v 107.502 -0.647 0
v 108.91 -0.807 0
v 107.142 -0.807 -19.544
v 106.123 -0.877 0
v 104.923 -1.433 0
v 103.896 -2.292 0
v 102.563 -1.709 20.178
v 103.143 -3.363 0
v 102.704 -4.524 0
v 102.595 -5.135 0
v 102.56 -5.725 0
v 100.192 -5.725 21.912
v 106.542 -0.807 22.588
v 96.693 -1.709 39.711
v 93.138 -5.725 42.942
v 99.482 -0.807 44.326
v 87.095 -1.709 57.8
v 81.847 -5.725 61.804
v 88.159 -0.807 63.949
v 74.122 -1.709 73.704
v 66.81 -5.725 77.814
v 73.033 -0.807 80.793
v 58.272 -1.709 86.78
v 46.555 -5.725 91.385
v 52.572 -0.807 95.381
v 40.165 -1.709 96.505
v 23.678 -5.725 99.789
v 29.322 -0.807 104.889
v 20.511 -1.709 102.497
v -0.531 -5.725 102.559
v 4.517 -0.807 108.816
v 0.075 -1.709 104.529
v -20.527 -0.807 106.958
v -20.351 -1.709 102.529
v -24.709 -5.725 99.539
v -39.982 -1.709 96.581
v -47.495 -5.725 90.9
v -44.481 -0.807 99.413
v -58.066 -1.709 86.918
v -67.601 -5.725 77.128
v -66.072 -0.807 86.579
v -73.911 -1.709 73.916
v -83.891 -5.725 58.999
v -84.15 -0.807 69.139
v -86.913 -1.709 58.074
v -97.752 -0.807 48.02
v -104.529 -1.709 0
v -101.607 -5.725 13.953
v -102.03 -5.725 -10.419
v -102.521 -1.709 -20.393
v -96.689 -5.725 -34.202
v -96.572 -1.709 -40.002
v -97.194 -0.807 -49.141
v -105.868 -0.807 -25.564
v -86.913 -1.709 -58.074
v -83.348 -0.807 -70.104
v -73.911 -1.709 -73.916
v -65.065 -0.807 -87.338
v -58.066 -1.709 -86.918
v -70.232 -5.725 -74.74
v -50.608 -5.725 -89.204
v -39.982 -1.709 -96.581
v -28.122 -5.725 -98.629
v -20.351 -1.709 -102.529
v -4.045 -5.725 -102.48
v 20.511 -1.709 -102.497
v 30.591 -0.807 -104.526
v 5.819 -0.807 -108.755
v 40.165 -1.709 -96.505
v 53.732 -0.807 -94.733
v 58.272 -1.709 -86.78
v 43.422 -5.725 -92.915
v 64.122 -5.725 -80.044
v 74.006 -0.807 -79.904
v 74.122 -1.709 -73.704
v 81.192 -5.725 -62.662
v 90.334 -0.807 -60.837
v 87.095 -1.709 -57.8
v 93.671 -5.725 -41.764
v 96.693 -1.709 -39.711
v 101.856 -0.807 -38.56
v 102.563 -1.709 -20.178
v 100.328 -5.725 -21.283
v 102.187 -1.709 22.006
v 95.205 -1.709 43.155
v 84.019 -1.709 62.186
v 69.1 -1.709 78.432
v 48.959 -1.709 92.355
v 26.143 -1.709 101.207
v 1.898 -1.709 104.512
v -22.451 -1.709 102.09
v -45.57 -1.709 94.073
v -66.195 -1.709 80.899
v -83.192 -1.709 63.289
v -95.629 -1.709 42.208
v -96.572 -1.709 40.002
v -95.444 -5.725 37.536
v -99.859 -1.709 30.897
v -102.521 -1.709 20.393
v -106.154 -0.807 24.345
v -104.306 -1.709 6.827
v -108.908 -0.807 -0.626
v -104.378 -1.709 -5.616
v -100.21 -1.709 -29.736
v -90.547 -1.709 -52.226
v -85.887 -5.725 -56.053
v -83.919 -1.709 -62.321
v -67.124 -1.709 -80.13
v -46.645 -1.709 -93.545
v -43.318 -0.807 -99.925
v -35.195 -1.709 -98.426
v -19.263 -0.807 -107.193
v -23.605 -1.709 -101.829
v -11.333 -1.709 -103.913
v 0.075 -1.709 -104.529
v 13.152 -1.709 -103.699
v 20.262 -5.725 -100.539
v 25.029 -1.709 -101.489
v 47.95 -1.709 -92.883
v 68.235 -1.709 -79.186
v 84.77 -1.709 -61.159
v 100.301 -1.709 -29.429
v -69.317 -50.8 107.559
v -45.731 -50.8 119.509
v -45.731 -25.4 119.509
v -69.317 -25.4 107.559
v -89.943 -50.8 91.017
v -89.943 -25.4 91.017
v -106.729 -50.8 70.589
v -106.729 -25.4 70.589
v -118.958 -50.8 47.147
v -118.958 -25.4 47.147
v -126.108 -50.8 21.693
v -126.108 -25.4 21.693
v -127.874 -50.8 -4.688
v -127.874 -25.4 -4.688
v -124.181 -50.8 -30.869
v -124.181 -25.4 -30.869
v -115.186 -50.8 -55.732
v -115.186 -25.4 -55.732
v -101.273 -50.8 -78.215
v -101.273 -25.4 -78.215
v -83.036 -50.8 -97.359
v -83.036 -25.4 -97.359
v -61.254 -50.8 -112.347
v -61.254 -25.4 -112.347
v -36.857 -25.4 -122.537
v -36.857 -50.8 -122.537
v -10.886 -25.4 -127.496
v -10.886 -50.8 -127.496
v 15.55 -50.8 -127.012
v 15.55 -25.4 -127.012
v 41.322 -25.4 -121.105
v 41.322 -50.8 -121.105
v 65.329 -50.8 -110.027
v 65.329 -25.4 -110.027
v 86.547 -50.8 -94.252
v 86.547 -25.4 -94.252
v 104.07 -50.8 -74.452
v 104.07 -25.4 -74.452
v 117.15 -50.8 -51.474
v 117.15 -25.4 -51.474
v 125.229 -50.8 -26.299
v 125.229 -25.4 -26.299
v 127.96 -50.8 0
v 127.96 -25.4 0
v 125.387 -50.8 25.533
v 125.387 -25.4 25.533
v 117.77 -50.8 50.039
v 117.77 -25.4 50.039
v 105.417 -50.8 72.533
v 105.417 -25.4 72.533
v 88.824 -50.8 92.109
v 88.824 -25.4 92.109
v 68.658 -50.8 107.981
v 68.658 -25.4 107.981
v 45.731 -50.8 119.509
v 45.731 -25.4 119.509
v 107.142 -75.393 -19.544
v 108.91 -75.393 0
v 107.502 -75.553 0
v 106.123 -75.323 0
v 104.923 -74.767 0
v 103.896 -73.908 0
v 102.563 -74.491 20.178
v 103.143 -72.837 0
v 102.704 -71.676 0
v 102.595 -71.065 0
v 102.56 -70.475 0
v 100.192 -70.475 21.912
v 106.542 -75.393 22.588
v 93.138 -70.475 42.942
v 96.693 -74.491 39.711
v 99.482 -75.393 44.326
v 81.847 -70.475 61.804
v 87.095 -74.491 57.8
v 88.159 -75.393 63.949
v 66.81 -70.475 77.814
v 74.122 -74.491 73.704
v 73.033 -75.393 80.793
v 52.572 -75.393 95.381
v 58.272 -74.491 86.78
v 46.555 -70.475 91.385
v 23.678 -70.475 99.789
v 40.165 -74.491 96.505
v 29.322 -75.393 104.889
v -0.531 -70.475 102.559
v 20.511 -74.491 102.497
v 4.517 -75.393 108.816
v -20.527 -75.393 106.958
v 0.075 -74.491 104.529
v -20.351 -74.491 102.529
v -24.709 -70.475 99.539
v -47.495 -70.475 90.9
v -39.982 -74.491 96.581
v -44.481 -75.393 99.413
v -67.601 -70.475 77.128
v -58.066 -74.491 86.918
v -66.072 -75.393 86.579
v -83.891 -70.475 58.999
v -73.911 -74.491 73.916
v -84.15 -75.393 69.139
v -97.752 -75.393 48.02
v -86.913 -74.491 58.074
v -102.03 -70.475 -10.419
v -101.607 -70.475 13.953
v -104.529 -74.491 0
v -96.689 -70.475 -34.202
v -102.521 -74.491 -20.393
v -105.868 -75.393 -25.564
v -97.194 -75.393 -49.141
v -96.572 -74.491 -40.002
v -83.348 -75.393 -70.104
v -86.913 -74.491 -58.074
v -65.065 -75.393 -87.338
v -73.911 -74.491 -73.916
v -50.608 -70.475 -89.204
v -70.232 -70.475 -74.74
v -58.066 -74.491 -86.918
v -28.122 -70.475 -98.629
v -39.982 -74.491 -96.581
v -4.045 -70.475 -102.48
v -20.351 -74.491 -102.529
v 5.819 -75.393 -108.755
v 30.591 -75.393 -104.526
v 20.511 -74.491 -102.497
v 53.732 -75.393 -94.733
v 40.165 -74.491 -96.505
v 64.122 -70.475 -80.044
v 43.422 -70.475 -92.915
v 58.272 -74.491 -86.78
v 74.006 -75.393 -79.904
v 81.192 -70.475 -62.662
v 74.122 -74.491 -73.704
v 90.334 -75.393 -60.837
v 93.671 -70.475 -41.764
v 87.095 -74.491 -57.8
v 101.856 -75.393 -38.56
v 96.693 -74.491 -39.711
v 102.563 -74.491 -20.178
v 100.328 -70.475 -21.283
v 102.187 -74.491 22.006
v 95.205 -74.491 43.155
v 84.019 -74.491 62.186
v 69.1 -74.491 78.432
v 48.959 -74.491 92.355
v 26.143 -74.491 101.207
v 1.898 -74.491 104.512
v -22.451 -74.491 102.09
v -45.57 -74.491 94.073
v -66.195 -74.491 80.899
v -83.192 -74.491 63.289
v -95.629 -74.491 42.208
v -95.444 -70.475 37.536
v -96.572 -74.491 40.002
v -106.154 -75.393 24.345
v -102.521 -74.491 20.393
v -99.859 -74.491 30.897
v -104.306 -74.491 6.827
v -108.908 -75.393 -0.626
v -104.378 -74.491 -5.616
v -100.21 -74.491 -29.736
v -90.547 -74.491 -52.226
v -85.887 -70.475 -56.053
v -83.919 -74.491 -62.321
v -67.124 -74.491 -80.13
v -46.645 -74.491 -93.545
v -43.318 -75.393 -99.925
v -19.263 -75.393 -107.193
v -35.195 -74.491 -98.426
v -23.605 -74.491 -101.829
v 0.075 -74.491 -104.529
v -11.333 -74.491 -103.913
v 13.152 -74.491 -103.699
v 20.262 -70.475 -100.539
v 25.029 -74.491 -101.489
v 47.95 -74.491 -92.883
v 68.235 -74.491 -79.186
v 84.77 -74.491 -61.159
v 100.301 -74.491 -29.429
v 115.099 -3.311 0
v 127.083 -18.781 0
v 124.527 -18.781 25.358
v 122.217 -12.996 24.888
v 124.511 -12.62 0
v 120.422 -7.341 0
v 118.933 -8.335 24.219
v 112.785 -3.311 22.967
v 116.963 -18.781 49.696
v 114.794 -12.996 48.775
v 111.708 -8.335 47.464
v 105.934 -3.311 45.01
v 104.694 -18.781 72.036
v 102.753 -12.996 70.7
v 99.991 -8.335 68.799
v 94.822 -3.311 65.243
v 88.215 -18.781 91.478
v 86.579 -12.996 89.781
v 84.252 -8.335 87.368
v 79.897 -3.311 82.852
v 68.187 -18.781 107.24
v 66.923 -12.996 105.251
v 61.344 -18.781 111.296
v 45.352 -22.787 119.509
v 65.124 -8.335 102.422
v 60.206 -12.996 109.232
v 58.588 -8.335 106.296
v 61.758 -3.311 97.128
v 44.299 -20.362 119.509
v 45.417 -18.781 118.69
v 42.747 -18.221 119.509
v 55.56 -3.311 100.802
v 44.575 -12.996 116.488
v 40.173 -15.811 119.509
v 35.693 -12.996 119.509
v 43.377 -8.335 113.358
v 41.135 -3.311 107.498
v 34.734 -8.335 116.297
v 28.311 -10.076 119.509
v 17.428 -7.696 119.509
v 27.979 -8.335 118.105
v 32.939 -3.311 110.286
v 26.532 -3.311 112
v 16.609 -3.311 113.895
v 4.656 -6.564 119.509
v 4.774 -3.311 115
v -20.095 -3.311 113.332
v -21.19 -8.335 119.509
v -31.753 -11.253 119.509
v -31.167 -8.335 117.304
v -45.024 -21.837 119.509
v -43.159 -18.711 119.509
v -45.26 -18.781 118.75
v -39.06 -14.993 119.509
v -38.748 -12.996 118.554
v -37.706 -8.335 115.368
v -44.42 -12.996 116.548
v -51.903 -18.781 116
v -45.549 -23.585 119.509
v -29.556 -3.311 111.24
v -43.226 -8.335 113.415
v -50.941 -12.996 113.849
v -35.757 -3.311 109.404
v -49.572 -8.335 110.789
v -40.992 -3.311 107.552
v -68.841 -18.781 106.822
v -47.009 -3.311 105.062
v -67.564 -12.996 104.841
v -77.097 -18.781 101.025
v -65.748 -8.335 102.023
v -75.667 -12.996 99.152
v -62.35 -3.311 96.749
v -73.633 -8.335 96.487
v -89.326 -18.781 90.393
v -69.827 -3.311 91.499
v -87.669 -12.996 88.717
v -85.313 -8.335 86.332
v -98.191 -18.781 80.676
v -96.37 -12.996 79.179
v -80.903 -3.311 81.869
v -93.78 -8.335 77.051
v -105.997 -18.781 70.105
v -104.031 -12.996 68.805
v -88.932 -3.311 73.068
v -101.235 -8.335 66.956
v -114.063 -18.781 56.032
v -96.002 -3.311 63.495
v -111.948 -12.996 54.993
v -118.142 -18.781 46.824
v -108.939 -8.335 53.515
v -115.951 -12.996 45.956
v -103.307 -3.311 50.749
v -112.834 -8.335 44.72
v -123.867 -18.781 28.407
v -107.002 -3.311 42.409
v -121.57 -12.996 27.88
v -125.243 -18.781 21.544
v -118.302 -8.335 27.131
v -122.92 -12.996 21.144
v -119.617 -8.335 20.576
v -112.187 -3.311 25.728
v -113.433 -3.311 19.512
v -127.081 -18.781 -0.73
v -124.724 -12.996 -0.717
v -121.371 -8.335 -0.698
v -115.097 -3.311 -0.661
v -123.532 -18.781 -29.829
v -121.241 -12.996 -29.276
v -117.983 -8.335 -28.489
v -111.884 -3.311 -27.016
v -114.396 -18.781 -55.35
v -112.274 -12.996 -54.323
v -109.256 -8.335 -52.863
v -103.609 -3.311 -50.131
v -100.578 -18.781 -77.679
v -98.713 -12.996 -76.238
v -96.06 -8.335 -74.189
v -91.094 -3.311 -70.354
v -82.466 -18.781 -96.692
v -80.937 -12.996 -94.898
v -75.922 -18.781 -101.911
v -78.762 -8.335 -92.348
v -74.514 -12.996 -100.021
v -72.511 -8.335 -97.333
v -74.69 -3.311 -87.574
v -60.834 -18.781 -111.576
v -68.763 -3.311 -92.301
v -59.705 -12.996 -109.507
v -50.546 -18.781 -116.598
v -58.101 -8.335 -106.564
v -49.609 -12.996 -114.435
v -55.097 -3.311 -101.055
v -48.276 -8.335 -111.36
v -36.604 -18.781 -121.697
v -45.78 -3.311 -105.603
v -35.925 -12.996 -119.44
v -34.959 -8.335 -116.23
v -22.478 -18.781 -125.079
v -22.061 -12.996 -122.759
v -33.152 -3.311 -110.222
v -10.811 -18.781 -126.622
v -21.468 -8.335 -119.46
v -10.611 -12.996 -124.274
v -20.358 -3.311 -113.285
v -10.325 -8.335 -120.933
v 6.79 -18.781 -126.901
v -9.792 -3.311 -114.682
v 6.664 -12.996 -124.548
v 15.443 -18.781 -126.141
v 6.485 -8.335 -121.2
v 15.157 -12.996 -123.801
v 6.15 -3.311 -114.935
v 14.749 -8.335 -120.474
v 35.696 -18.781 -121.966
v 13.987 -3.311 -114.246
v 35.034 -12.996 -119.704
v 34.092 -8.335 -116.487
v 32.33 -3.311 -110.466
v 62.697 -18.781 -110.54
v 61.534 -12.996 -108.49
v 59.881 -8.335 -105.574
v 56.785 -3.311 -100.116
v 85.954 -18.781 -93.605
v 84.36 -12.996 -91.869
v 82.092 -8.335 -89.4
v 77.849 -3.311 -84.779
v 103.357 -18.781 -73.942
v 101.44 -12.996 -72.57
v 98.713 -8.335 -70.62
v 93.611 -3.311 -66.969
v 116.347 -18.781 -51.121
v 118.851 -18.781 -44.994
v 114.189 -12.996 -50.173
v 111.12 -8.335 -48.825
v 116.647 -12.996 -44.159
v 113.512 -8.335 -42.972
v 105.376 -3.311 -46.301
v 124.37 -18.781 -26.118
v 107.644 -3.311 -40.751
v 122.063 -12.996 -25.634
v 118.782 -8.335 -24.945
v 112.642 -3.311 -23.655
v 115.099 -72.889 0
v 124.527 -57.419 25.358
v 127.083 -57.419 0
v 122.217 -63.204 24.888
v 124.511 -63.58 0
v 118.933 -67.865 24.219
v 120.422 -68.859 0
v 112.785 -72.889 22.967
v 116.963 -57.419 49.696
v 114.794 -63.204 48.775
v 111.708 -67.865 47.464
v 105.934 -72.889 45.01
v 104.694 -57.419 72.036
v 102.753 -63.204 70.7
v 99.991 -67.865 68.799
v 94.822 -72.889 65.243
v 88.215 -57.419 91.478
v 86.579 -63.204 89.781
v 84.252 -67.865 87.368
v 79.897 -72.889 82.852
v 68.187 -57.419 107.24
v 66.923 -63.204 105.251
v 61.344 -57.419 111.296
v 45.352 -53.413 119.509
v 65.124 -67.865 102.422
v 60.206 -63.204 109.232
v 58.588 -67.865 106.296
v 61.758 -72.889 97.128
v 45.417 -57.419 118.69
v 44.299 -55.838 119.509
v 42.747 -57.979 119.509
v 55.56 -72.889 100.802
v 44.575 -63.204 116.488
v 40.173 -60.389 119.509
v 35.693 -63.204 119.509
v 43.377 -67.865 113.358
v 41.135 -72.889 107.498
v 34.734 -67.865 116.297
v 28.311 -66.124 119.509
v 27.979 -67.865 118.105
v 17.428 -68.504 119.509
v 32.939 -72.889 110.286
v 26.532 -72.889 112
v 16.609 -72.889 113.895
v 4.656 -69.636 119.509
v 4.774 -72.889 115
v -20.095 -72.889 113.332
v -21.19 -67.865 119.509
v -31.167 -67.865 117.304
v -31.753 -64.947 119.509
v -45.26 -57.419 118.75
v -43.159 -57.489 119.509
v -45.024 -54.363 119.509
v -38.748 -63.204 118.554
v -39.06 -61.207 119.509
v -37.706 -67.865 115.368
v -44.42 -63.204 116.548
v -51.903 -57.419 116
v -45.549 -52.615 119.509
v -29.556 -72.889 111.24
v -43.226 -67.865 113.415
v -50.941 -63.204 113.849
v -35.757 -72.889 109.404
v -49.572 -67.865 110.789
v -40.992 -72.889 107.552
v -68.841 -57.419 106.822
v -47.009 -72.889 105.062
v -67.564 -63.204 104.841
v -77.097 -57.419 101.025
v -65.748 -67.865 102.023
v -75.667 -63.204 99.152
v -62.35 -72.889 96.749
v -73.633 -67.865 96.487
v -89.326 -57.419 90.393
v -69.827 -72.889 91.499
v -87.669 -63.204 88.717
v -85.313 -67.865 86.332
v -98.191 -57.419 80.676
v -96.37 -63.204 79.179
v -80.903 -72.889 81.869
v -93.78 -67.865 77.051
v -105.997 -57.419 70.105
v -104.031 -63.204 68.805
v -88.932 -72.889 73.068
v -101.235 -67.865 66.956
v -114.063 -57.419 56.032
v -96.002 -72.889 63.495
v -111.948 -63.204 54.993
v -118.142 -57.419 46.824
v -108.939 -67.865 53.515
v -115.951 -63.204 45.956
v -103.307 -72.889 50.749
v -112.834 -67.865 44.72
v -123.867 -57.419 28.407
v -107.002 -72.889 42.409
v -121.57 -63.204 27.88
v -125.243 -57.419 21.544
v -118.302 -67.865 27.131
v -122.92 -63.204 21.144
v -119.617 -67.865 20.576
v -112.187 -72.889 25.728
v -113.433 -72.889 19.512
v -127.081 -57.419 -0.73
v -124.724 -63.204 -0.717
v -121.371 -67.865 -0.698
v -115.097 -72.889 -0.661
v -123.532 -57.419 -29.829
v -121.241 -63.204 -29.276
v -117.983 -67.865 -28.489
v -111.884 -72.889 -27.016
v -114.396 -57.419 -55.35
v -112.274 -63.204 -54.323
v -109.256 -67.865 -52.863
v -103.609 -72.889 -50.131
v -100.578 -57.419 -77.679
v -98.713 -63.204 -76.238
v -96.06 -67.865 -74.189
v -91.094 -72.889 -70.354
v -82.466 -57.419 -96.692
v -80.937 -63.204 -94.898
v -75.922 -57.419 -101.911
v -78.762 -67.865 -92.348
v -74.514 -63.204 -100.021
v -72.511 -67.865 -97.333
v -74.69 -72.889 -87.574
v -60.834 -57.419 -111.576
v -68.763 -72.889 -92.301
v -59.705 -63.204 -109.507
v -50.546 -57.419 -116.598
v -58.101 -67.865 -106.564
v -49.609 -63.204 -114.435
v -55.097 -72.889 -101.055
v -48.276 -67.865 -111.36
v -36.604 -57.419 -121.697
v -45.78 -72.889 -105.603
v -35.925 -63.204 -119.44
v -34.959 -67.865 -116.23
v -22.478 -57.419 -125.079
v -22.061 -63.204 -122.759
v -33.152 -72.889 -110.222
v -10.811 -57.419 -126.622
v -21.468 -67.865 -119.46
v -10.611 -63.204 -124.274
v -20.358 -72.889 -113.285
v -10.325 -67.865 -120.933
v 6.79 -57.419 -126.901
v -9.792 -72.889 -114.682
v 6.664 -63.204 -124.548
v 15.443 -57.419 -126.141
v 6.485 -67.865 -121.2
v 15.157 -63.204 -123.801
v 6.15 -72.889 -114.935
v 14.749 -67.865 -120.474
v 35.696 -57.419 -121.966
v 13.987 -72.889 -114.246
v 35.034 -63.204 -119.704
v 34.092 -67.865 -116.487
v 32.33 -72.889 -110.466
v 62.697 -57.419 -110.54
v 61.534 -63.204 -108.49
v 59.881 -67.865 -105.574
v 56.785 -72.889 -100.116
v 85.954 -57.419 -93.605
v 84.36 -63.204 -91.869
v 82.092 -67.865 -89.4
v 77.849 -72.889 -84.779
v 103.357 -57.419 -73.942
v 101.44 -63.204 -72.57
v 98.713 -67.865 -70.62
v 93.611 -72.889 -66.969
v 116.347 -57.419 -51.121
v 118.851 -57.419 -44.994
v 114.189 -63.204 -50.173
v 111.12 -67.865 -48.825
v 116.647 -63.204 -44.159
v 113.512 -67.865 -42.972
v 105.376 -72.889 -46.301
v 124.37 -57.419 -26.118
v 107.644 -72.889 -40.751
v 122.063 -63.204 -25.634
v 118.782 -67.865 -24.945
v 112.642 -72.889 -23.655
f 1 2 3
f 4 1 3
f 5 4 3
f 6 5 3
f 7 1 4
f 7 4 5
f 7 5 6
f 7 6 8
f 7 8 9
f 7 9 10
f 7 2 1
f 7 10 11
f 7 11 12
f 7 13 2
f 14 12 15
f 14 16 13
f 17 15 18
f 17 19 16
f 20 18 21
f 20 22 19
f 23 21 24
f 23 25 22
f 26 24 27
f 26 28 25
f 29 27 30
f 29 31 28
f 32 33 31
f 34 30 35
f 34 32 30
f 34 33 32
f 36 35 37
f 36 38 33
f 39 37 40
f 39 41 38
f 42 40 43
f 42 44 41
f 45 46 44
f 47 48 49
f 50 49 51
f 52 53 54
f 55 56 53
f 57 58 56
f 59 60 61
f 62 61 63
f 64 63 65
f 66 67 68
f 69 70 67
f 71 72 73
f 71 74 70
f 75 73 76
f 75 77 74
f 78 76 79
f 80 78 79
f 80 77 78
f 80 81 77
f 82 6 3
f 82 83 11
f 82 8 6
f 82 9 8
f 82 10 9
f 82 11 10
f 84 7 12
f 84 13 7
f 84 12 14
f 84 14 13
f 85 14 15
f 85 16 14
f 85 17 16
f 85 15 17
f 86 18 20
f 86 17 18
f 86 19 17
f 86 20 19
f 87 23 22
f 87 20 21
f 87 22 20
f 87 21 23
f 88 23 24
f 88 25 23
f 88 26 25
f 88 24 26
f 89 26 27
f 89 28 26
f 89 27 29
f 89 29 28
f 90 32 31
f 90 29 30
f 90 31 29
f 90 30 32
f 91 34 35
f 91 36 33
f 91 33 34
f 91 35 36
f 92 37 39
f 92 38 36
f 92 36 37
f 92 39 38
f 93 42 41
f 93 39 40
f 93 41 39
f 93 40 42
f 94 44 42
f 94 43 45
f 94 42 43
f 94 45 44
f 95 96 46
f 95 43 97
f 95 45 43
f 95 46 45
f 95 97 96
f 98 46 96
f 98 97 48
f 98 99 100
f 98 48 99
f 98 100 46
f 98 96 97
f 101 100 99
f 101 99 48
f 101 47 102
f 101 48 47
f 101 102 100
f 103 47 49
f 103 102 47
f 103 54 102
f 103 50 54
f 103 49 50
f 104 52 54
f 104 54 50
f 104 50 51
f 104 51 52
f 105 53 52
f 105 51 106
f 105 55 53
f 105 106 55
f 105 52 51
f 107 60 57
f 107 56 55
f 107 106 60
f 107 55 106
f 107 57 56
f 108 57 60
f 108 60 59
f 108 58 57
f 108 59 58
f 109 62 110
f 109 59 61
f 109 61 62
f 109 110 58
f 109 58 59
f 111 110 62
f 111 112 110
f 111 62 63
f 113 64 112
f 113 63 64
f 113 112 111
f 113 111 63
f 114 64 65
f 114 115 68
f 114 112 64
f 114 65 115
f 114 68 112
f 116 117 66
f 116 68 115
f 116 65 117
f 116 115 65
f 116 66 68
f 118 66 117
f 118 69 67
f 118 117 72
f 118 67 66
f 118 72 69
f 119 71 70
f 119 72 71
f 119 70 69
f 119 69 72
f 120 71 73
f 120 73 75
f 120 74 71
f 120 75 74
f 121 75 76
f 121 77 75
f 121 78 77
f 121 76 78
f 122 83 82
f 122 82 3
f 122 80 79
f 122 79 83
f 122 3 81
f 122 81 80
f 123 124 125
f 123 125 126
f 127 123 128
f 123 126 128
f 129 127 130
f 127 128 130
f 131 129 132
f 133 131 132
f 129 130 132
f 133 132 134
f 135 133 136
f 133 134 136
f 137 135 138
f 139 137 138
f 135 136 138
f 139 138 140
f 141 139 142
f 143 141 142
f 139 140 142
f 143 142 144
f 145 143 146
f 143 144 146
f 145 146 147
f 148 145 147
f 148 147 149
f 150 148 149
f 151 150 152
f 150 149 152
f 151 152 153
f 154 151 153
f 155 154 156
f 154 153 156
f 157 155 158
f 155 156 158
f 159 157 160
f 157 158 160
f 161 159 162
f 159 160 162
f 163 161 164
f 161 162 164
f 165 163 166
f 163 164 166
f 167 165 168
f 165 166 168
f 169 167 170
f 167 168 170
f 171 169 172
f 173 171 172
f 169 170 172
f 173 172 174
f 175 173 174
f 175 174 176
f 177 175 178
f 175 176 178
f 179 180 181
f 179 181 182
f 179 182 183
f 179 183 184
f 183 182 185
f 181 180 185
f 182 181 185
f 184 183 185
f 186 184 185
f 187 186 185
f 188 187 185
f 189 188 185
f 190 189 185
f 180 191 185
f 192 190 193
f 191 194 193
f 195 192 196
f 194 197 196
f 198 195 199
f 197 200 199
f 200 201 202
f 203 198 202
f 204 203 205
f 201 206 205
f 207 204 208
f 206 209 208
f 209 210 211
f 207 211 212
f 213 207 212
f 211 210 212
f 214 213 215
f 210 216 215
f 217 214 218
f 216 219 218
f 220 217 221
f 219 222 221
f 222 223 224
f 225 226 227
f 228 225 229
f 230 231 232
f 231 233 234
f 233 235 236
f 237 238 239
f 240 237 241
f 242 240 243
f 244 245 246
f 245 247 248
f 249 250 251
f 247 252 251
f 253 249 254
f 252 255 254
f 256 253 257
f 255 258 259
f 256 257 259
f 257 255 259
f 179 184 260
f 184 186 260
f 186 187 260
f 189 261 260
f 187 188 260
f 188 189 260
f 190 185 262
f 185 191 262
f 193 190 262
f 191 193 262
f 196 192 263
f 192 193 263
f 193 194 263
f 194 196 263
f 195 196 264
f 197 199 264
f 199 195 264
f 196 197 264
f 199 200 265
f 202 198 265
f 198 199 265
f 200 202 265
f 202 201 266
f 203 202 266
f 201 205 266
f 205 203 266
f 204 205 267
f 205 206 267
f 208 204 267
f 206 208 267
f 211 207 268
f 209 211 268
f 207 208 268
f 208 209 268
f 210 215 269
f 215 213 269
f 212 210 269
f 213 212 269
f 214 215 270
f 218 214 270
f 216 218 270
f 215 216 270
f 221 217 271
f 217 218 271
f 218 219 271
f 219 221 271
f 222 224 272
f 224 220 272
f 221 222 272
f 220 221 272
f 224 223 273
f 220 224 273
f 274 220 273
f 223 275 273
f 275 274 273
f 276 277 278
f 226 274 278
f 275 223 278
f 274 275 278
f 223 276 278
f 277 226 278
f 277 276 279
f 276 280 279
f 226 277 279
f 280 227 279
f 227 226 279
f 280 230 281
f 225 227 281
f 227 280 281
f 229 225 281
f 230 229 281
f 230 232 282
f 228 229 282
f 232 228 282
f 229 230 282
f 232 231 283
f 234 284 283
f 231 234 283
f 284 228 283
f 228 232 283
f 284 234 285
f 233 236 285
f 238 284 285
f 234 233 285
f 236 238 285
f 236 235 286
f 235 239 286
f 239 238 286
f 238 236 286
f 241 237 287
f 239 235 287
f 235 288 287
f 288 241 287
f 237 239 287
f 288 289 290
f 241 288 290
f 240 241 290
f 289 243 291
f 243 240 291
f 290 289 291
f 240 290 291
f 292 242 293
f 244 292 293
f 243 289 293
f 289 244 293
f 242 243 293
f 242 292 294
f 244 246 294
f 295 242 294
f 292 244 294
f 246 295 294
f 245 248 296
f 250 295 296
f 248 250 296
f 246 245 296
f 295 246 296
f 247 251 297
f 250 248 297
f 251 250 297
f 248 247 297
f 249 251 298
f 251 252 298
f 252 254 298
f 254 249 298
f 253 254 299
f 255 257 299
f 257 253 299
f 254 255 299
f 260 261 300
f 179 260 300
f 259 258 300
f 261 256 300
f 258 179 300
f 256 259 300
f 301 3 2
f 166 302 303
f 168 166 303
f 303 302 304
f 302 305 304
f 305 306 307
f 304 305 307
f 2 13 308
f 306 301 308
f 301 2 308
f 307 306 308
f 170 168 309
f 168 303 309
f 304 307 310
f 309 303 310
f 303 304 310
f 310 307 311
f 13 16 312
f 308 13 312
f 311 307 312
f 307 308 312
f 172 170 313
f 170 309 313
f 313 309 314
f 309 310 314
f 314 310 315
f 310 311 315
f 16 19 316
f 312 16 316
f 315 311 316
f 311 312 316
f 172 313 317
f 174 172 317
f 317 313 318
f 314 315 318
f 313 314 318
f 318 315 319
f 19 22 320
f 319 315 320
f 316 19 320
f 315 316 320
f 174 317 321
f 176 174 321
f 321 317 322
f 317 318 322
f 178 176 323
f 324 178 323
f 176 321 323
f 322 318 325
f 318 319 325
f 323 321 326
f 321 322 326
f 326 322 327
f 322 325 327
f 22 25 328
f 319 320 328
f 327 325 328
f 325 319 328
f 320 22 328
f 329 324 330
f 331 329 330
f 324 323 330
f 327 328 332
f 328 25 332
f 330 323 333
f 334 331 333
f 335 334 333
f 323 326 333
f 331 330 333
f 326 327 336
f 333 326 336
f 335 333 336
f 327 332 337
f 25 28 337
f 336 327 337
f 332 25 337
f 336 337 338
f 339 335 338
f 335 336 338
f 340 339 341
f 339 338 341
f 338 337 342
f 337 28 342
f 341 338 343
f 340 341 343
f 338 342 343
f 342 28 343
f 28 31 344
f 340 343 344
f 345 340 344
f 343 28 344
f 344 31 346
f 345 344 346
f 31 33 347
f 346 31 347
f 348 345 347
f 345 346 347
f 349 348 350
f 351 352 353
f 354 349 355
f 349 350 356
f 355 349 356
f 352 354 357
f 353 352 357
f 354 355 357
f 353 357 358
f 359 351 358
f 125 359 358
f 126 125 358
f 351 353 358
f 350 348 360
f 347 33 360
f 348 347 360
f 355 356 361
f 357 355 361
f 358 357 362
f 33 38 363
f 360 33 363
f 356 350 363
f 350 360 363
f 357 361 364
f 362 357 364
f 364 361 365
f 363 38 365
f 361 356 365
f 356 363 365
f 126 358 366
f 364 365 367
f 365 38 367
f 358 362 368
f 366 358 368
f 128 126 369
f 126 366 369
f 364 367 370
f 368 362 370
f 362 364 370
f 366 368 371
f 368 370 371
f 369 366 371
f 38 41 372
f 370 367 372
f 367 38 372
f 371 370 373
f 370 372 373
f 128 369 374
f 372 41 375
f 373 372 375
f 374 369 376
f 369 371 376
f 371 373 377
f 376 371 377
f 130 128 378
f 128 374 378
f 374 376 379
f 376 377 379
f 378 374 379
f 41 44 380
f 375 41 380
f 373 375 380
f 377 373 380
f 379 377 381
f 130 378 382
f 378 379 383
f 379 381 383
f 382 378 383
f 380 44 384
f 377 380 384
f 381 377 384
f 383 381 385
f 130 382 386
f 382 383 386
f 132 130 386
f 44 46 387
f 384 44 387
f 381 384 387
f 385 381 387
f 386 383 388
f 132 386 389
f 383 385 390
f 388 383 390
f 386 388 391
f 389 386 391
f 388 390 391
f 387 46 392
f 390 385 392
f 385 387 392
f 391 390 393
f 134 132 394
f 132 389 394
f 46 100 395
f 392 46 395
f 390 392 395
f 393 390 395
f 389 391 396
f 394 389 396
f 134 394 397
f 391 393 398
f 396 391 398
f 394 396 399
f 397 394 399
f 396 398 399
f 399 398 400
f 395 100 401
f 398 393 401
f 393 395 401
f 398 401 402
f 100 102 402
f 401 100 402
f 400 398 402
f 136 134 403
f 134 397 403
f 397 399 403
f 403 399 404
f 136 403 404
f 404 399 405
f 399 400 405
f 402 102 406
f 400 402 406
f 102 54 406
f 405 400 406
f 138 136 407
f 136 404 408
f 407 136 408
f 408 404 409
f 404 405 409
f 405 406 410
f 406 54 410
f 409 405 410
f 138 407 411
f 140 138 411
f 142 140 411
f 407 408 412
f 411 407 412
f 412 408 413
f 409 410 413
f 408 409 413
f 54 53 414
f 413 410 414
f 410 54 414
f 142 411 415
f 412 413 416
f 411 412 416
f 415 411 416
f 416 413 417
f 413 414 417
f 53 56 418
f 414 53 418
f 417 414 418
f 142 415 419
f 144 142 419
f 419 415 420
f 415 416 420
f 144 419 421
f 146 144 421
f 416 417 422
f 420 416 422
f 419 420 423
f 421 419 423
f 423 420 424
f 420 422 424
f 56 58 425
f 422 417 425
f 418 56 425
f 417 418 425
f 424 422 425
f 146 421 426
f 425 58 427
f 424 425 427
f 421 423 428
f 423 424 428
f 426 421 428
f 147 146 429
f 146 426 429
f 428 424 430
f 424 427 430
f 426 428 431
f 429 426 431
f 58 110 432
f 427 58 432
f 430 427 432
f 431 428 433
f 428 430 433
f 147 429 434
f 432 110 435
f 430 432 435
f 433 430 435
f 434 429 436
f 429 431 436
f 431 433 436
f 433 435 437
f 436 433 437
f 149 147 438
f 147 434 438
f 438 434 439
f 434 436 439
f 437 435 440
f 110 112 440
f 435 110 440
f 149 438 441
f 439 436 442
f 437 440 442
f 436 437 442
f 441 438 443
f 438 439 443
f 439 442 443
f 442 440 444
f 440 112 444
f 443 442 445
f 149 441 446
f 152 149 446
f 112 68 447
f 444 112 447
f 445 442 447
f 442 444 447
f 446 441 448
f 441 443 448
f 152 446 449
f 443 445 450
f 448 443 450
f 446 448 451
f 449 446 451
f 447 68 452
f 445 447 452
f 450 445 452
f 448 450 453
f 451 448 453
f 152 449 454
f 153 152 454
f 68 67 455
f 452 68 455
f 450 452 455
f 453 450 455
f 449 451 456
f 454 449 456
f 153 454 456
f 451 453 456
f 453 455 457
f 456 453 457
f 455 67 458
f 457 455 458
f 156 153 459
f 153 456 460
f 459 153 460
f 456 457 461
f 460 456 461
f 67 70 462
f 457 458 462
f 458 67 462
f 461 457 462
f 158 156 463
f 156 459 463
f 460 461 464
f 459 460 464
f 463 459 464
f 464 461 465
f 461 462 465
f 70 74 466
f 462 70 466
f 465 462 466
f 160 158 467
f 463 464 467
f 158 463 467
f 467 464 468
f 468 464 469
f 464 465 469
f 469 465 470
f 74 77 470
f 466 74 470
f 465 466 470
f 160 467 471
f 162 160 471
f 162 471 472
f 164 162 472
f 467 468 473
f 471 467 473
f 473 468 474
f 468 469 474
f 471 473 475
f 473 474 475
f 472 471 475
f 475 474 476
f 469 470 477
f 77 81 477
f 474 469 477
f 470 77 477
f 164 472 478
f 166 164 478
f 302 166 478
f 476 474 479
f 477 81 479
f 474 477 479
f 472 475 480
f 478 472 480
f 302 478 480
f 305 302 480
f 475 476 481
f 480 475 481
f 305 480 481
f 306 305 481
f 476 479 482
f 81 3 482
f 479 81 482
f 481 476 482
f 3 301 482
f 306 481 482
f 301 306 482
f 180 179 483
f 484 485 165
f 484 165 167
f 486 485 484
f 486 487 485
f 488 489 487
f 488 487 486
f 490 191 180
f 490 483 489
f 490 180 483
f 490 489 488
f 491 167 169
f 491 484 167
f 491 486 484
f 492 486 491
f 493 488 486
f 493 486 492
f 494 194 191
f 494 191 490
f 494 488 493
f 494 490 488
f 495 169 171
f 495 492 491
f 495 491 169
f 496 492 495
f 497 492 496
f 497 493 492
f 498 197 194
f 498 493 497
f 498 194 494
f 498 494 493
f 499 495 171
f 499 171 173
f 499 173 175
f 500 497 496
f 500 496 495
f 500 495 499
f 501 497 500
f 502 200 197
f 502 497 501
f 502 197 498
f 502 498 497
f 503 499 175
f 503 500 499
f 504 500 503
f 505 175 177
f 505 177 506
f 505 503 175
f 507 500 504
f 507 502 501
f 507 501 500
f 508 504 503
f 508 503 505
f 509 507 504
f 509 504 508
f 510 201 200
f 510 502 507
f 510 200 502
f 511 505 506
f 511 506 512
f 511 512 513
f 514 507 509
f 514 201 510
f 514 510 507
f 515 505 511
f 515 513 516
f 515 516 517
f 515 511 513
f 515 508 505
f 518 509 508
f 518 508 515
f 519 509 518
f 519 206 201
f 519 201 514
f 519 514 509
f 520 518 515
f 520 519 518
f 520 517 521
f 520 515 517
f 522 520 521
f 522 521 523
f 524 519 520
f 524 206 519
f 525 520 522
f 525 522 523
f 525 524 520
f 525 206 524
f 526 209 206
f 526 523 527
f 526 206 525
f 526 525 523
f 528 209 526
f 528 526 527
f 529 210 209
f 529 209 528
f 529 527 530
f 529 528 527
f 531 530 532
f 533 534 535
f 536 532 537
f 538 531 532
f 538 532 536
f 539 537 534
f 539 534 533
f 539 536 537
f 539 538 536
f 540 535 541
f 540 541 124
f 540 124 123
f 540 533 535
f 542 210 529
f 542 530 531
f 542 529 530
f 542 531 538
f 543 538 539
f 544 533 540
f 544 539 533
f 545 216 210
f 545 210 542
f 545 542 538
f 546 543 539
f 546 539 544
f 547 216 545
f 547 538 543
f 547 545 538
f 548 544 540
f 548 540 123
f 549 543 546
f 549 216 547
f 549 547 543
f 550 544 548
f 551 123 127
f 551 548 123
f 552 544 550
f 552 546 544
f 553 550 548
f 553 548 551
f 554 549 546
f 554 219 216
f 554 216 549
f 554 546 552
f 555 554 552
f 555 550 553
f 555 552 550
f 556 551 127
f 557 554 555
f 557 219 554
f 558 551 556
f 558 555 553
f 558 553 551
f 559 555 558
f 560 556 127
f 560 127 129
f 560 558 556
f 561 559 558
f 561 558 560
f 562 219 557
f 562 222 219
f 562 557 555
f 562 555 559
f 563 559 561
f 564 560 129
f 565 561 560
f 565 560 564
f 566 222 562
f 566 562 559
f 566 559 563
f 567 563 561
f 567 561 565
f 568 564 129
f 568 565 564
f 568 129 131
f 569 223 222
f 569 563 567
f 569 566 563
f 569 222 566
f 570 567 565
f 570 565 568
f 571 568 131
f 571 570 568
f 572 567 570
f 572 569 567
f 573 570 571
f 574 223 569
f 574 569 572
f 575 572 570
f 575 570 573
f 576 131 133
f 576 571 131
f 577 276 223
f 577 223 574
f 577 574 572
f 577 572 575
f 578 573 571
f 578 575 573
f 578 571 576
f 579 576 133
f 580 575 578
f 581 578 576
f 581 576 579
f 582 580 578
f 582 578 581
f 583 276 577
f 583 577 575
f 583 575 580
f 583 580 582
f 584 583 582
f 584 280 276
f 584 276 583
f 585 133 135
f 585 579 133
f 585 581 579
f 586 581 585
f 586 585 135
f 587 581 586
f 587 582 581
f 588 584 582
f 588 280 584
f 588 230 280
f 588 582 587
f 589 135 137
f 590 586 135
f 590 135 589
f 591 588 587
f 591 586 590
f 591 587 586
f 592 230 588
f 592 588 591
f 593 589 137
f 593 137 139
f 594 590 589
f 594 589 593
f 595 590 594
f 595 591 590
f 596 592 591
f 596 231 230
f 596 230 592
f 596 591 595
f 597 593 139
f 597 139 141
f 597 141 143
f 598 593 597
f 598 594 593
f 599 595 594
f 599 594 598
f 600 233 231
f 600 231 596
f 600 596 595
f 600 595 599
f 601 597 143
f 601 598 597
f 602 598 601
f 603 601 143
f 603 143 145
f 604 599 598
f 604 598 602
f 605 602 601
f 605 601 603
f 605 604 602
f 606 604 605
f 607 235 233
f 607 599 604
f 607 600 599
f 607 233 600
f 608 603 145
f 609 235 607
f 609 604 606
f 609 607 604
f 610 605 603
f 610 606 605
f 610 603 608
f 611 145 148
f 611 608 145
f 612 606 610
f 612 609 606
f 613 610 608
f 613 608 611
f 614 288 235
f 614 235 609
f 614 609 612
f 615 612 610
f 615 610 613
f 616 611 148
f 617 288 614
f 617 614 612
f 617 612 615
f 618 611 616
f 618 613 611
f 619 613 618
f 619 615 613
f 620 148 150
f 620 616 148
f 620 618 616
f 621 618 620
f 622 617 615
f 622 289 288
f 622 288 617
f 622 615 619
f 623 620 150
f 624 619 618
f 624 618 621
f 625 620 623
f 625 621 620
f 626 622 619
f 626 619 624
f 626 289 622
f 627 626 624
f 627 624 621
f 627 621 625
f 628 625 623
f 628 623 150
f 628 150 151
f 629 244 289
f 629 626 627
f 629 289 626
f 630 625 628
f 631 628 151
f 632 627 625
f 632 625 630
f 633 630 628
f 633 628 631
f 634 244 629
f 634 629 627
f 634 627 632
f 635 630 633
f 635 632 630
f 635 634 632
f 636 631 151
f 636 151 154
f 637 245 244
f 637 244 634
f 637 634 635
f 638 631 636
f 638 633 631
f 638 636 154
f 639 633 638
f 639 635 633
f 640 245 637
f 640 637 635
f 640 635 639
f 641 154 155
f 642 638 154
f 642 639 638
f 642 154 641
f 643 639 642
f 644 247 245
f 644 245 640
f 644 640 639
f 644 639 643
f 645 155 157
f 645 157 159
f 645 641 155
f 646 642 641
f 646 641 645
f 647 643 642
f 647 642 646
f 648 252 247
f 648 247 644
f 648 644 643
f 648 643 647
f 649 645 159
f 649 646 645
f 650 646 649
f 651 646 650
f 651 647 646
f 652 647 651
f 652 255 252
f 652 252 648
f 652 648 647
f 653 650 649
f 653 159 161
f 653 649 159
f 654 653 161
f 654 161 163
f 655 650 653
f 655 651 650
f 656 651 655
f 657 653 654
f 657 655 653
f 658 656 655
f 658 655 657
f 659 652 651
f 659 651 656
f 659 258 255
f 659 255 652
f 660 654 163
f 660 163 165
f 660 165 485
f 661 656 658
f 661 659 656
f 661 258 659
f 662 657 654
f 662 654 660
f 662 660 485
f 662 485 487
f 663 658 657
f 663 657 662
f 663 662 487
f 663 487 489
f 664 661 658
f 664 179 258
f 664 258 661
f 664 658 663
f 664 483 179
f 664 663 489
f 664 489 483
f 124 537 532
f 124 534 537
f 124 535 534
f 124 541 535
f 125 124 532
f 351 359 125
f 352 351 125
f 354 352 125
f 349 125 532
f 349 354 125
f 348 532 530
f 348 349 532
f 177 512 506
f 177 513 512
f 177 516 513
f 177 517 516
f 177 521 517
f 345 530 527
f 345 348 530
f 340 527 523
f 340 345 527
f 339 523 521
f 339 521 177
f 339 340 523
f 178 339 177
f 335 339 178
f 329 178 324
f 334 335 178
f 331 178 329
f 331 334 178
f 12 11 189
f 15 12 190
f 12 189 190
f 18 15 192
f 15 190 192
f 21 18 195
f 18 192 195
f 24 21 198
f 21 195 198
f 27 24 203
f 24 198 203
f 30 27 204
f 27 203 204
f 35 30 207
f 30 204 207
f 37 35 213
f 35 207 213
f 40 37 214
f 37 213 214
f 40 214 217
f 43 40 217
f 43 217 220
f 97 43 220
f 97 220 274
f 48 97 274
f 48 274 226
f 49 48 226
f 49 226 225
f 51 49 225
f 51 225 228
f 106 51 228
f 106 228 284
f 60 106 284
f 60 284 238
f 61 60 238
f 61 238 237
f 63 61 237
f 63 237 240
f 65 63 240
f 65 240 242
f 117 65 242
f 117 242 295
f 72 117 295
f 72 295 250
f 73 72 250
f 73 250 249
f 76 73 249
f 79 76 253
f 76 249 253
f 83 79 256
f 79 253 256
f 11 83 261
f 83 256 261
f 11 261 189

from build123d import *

# Parameters (mm, degrees)
F0_R     = 127.9602052378
F1_DEPTH = 76.2
F2_R     = 25.4
F3_DEPTH = 101.6
F4_R     = 5.08
F5_W     = 206.9260179996
F5_H     = 31.6136926413
F6_DEPTH = 101.6


with BuildPart() as f1:
    # F0 (on Front) → F1 (new body)
    with BuildSketch(Plane.XZ):
        Circle(F0_R)
    extrude(amount=F1_DEPTH)

    # F2
    f2_edges = [f1.edges().sort_by_distance(p)[0] for p in [
        (-127.960205, -76.2, 0),
        (-127.960205, 0, 0),
    ]]
    fillet(f2_edges, radius=F2_R)

    # F3 (cut): a face of the model
    f3_faces = [f1.faces().sort_by_distance(p)[0] for p in [
        (0, -76.2, 0),
    ]]
    extrude(f3_faces, amount=-F3_DEPTH, mode=Mode.SUBTRACT)

    # F4
    f4_edges = [f1.edges().sort_by_distance(p)[0] for p in [
        (127.960205, -38.1, 0),
        (-127.960205, -25.4, 0),
        (-127.960205, -50.8, 0),
        (-102.560205, 0, 0),
        (-102.560205, -76.2, 0),
    ]]
    fillet(f4_edges, radius=F4_R)

    # F5 (on Front) → F6 (cut)
    with BuildSketch(Plane.XZ):
        with Locations((3.8319602609, 135.3162005544)):
            Rectangle(F5_W, F5_H)
    extrude(amount=F6_DEPTH, mode=Mode.SUBTRACT)


solid = f1.part
